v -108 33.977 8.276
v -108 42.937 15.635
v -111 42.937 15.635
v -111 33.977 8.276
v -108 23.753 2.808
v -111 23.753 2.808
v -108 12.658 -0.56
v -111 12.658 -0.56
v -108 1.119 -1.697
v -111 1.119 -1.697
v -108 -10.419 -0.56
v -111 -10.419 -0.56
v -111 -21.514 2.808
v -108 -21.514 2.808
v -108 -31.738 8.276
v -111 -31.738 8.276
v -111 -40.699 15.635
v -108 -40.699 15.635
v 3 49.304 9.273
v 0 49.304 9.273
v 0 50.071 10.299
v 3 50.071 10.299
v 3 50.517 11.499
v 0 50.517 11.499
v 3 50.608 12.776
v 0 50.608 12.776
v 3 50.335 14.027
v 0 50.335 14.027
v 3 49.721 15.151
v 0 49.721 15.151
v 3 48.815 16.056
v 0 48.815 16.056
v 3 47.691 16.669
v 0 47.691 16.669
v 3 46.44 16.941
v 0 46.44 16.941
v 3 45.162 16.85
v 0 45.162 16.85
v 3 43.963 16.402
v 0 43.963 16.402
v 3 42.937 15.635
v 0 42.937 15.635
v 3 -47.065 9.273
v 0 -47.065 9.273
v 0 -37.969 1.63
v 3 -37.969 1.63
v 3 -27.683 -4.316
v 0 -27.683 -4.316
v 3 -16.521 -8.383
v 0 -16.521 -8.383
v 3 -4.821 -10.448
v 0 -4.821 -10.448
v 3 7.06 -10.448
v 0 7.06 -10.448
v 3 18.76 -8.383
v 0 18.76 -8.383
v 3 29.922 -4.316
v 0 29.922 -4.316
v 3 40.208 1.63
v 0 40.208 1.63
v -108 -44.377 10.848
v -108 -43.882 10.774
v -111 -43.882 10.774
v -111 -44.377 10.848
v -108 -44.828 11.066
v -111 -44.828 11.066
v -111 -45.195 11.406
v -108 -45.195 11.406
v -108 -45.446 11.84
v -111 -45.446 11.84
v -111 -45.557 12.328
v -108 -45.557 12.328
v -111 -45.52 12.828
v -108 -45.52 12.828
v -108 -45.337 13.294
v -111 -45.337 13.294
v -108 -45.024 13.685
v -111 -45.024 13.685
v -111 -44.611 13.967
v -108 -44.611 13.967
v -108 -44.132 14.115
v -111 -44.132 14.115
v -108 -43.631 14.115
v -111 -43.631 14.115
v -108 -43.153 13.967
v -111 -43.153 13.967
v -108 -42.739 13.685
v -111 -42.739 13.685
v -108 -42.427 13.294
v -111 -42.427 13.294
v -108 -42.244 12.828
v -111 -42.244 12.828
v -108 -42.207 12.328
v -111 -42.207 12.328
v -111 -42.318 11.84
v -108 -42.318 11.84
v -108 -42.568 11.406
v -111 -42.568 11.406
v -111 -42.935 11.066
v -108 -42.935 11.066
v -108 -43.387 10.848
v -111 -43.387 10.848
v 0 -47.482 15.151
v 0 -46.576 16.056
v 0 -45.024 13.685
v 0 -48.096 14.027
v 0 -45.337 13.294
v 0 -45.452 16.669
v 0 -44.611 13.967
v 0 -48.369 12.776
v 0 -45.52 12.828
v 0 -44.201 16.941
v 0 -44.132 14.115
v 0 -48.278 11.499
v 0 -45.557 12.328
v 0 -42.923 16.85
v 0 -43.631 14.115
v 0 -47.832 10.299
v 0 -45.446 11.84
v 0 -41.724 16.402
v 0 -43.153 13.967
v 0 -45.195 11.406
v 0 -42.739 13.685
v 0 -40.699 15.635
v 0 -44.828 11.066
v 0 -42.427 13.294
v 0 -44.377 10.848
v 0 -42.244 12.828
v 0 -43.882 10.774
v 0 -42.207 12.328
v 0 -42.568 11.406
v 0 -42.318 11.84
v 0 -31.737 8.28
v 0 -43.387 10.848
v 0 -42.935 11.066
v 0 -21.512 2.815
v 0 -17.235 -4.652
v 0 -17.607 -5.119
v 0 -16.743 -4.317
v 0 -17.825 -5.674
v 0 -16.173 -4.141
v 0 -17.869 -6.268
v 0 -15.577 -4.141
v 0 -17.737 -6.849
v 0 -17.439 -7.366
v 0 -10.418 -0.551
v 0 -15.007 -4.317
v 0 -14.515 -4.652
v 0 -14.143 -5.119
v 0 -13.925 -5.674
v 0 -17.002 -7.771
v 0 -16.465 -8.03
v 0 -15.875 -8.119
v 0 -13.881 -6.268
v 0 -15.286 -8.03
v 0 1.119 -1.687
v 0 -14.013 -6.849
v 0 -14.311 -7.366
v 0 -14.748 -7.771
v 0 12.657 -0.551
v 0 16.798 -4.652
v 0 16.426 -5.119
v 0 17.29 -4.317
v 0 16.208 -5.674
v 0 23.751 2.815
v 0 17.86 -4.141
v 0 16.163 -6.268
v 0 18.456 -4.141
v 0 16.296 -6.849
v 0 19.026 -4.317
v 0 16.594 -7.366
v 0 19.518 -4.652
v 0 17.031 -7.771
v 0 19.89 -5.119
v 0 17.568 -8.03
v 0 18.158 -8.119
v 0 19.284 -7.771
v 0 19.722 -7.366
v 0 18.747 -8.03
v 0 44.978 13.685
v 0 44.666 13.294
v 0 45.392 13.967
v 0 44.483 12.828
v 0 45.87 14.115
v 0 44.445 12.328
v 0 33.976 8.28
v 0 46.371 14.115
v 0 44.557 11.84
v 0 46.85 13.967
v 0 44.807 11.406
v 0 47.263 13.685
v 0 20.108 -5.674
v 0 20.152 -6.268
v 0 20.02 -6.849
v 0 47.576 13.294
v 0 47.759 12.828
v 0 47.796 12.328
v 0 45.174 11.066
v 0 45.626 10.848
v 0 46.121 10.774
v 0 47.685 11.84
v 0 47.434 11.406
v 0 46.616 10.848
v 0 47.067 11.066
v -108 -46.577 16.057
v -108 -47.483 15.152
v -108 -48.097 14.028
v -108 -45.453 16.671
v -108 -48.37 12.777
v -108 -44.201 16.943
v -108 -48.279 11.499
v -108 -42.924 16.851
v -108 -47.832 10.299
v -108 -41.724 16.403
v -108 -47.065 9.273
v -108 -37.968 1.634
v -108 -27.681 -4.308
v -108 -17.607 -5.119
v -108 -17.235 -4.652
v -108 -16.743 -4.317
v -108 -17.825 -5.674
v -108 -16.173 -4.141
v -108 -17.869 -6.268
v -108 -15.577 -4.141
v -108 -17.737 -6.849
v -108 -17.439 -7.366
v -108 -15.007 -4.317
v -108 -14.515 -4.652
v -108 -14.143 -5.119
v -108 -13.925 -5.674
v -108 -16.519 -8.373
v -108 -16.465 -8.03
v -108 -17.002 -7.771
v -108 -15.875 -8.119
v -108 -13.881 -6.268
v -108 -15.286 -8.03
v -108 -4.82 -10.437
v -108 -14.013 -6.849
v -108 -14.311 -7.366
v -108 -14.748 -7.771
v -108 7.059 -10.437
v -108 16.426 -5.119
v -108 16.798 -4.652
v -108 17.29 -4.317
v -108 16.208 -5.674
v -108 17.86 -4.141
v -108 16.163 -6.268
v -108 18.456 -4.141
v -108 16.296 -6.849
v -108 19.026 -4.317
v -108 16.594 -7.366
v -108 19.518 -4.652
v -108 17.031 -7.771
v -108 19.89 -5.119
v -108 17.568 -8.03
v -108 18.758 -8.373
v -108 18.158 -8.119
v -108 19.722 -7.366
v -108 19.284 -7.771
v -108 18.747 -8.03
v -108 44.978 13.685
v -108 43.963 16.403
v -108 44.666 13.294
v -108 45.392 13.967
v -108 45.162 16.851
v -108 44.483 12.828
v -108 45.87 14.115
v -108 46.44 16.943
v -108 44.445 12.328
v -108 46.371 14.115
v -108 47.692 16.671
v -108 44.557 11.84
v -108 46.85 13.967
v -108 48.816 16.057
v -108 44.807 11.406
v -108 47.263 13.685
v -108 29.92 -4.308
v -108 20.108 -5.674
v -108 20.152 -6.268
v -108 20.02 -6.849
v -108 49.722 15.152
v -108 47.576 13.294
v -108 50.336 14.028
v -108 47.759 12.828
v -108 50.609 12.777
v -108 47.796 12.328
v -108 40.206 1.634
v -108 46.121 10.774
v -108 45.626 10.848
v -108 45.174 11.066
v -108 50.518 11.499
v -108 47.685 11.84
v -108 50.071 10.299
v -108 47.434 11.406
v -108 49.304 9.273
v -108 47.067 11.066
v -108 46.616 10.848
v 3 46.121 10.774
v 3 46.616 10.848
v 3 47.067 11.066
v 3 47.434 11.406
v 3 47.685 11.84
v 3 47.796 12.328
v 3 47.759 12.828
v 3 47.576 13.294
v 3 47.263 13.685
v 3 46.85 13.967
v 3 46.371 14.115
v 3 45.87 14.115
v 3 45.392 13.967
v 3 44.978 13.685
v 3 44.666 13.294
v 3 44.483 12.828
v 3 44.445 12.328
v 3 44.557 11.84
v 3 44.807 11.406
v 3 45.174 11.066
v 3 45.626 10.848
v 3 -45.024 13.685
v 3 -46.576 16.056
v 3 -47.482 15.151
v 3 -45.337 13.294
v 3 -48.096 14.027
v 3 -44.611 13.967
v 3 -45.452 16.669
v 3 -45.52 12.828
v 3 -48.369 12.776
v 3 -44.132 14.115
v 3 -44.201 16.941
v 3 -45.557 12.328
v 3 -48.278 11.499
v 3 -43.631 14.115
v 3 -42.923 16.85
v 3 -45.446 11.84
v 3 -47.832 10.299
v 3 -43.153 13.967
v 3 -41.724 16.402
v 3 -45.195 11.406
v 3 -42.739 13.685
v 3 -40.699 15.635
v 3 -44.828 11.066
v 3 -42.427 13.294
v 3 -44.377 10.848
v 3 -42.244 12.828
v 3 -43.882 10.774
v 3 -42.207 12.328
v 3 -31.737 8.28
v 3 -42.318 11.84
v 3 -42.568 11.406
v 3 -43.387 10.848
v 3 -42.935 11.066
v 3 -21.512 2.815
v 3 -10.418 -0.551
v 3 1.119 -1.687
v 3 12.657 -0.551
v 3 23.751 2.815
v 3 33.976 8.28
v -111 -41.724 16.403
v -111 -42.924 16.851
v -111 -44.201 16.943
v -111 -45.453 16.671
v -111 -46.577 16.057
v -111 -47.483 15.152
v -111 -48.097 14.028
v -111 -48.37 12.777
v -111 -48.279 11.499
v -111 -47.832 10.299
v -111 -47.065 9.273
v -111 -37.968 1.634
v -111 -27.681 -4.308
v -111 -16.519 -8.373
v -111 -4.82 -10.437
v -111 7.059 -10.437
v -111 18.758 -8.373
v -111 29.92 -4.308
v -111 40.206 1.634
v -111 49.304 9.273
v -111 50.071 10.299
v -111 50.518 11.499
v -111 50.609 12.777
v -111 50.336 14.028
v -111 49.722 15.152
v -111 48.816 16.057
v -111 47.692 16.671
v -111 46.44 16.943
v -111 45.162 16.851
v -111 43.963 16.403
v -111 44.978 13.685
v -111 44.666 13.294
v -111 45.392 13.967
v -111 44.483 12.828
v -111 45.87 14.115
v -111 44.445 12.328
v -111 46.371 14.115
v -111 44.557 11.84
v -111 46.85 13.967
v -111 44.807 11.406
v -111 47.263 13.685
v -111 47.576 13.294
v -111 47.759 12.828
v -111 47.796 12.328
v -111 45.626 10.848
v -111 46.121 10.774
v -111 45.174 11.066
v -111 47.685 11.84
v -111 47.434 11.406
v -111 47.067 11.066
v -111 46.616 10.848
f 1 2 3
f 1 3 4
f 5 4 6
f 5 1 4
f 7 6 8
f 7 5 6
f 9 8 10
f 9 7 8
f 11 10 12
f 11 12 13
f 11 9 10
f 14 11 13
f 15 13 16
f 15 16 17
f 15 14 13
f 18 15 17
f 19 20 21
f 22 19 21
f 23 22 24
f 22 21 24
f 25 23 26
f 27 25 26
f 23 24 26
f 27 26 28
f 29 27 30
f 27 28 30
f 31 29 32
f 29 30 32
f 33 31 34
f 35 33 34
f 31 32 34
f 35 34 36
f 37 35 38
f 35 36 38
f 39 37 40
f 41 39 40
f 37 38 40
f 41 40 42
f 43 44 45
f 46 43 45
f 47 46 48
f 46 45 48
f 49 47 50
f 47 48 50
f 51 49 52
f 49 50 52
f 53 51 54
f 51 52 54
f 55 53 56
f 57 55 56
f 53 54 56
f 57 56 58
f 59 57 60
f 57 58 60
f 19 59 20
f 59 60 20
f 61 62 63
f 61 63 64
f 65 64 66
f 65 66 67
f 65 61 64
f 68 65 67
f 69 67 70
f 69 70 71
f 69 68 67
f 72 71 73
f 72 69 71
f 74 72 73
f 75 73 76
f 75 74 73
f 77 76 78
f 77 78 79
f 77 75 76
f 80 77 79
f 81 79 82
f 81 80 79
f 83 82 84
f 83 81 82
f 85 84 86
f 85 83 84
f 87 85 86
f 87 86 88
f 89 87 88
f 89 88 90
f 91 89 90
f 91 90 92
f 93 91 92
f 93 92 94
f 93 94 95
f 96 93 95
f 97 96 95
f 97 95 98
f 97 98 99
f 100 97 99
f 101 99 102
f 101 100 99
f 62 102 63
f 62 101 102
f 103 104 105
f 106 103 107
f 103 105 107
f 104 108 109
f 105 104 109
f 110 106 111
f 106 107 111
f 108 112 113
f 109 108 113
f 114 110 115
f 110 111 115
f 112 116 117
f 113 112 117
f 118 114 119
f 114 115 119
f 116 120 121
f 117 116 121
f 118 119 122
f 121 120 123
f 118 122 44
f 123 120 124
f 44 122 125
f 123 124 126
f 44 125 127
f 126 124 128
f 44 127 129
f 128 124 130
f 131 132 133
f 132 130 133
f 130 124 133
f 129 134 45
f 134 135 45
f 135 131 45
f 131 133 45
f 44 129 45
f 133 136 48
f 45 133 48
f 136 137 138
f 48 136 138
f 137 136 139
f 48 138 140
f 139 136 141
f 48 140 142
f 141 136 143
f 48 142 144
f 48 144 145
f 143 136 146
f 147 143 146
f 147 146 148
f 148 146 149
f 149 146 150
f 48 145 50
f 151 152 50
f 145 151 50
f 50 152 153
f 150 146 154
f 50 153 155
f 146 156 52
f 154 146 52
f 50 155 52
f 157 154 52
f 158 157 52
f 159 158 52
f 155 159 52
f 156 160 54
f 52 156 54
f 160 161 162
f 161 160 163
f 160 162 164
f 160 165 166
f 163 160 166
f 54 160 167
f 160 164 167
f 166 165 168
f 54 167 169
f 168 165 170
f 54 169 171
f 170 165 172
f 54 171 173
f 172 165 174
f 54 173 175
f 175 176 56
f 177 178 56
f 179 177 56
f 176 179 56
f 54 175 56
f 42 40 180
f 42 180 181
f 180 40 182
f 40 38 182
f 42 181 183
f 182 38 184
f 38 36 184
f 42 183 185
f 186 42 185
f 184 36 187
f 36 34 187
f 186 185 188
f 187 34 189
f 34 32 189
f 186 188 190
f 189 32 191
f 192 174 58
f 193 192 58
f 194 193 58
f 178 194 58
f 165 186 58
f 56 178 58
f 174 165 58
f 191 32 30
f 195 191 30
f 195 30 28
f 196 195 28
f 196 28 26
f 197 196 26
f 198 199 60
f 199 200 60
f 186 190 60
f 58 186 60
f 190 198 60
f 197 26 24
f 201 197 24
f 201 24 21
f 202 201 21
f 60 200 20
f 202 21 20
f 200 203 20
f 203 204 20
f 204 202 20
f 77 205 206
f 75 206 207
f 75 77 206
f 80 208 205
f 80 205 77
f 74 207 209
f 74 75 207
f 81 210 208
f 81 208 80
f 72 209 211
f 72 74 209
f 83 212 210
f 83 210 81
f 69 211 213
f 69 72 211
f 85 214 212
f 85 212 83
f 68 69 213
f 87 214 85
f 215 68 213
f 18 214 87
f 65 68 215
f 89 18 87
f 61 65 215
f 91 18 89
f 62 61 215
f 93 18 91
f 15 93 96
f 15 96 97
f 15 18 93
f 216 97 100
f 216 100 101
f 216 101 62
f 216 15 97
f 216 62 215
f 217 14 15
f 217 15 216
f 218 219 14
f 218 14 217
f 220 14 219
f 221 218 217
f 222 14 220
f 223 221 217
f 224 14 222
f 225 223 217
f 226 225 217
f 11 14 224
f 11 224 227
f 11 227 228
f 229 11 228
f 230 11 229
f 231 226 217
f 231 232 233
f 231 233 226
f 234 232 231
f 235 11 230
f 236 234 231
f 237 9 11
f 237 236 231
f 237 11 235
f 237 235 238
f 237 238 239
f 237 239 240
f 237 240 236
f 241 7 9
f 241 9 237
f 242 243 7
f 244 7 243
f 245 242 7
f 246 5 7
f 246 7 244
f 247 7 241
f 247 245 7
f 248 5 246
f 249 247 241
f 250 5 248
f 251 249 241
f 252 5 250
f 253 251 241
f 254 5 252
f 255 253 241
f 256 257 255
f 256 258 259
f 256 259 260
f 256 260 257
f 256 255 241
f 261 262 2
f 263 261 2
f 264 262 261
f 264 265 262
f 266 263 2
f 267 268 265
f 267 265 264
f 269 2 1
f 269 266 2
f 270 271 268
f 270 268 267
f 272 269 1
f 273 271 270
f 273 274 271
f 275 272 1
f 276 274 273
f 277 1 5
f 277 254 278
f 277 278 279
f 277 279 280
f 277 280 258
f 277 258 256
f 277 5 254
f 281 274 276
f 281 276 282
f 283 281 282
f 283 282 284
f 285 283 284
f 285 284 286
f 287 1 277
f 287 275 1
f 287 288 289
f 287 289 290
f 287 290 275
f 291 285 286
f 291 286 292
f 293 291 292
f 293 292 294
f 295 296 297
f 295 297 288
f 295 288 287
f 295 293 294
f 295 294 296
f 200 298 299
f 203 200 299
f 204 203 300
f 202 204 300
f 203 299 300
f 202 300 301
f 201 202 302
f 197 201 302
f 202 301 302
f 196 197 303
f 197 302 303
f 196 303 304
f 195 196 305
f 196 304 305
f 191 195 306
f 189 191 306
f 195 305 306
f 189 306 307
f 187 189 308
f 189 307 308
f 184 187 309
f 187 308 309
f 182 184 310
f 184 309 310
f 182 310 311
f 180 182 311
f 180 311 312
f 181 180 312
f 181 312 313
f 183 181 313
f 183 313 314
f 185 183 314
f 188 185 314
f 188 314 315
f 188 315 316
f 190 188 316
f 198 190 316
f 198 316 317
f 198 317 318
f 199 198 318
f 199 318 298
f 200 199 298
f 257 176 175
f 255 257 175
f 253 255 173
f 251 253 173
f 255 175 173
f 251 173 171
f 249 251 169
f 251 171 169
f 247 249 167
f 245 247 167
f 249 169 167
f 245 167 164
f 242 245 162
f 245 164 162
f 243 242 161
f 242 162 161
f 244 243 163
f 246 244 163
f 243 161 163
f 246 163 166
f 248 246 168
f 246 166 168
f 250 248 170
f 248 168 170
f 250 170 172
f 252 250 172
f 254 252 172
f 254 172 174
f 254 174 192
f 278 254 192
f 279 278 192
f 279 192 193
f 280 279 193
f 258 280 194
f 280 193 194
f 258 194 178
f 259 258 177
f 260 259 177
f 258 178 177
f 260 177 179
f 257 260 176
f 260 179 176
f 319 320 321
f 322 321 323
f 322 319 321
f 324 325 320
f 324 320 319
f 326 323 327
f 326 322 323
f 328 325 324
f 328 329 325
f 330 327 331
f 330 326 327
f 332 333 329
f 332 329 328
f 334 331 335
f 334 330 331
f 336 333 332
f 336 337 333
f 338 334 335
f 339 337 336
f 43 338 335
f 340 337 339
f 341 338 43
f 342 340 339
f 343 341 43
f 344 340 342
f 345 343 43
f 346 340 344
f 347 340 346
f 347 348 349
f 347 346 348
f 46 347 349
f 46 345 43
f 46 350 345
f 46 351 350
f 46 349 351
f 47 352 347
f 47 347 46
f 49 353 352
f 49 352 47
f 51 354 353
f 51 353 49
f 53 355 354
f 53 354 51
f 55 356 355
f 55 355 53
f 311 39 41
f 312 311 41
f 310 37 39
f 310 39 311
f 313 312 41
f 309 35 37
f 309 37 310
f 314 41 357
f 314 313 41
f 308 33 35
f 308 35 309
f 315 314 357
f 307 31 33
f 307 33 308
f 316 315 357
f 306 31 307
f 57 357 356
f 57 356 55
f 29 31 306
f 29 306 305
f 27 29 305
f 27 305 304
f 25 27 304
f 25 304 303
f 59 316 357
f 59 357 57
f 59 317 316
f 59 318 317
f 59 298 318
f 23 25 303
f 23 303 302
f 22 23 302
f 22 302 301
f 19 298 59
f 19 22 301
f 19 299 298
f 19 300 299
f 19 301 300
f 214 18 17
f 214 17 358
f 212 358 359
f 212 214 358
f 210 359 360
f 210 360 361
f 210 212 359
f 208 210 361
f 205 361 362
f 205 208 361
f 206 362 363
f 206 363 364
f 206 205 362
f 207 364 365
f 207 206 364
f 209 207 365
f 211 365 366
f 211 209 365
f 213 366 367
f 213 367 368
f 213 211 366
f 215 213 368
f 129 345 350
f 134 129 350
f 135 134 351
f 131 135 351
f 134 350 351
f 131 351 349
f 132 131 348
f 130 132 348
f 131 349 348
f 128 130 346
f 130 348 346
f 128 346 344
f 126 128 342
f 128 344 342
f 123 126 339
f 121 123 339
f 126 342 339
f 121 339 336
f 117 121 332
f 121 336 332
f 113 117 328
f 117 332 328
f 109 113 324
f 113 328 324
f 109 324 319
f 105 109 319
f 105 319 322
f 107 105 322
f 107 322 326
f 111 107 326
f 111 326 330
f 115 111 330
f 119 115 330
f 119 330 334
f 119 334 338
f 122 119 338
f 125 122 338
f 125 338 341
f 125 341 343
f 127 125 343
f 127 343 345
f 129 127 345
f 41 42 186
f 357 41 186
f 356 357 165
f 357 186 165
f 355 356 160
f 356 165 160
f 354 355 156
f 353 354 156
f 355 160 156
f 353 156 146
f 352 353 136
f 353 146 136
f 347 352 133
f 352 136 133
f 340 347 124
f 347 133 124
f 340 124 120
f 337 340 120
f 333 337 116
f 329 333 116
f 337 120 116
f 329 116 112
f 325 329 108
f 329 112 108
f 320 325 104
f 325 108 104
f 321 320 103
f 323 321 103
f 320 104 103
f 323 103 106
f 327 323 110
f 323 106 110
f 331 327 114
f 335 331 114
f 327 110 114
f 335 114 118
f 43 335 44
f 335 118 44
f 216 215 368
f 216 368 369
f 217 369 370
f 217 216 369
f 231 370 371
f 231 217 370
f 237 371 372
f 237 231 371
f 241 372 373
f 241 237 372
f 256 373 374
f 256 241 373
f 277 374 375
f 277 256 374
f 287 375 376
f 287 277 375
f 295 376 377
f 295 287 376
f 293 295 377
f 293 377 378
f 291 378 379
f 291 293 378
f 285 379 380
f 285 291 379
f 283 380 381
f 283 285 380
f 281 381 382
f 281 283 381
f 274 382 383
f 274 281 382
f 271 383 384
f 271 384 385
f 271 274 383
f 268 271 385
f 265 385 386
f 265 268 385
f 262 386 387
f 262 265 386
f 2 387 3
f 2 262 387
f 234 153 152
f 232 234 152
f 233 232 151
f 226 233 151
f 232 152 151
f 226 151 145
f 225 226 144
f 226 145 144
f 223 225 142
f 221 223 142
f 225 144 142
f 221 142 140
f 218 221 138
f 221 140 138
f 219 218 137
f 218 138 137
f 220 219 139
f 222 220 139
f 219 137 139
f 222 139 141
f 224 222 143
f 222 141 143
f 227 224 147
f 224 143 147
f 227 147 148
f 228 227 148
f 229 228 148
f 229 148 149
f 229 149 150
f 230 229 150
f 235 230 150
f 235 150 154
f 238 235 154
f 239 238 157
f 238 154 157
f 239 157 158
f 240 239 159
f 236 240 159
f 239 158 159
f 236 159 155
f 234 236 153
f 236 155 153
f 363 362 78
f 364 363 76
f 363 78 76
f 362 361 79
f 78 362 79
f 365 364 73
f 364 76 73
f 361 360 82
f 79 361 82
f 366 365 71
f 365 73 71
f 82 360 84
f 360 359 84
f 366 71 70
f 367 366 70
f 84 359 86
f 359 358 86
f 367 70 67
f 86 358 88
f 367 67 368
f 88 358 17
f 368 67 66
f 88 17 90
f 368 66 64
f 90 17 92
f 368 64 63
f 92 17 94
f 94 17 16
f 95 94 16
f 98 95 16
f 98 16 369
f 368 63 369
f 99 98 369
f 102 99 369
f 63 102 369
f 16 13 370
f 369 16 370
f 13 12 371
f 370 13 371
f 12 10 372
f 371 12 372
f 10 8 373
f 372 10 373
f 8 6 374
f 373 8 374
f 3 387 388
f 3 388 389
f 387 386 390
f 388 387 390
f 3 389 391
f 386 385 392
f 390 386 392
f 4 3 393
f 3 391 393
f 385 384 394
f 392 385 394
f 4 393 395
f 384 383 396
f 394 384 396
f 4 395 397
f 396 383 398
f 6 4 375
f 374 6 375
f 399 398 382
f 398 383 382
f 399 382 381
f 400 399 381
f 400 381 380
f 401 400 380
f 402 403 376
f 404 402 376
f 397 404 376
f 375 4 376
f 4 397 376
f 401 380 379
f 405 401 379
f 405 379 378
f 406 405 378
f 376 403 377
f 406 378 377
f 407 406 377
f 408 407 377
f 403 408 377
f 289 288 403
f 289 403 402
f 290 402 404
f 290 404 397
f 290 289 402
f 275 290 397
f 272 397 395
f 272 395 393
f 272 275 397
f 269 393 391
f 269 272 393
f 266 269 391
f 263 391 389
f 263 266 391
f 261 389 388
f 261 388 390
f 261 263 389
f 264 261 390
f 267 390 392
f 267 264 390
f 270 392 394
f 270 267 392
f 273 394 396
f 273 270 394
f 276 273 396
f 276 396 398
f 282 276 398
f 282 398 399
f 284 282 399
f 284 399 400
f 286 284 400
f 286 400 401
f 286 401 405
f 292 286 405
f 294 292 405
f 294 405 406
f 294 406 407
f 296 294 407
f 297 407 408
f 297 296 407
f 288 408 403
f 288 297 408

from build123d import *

# Parameters (mm, degrees)
BOSS_EXTRUDE1_DEPTH  = 3
SKETCH4_R            = 1.68
CUT_EXTRUDE1_DEPTH   = 54.466990195
SKETCH2_R            = 2
BOSS_EXTRUDE11_DEPTH = 108
SKETCH8_R            = 1.68
BOSS_EXTRUDE12_DEPTH = 3


with BuildPart() as part:
    # Sketch1 → Boss-Extrude1 (new body)
    with BuildSketch(Plane(origin=(0, 0, 0), x_dir=(0, 0, -1), z_dir=(1, 0, 0))):
        with BuildLine():
            ThreePointArc((-15.634588923, -40.698575462), (-15.635835692, -47.061289367), (-9.273122764, -47.06502941))
            ThreePointArc((-9.273122764, -47.06502941), (10.707664933, 1.119443717), (-9.273121767, 49.303917257))
            ThreePointArc((-9.273121767, 49.303917257), (-15.635834695, 49.300177346), (-15.634588058, 42.937463441))
            ThreePointArc((-15.634588058, 42.937463441), (1.687002572, 1.11944381), (-15.634588923, -40.698575462))
        make_face()
    extrude(amount=BOSS_EXTRUDE1_DEPTH)

    # Sketch4 → Cut-Extrude1 (cut, through all)
    with BuildSketch(Plane(origin=(3, 0, 0), x_dir=(0, 0, -1), z_dir=(1, 0, 0))):
        with Locations((-12.453854912, 46.120690349)):
            Circle(SKETCH4_R)
        with Locations((-12.453855844, -43.881802436)):
            Circle(SKETCH4_R)
    extrude(amount=-CUT_EXTRUDE1_DEPTH, mode=Mode.SUBTRACT)

    # Sketch2 → Boss-Extrude11 (add)
    with BuildSketch(Plane.ZY):
        with Locations(Location((-6.118587434, 18.157847035, 0), (0, 0, 180))):
            Circle(SKETCH2_R)
        with Locations(Location((-6.118587434, -15.875057848, 0), (0, 0, 180))):
            Circle(SKETCH2_R)
    extrude(amount=BOSS_EXTRUDE11_DEPTH)

    # Sketch8 → Boss-Extrude12 (add)
    with BuildSketch(Plane.ZY.offset(108)):
        with BuildLine():
            ThreePointArc((9.273121767, 49.303917257), (15.63708182, 49.301423495), (15.634588058, 42.937463441))
            ThreePointArc((15.634588058, 42.937463441), (-1.696602448, 1.11944381), (15.634588923, -40.698575462))
            ThreePointArc((15.634588923, -40.698575462), (15.637082818, -47.062535516), (9.273122764, -47.06502941))
            ThreePointArc((9.273122764, -47.06502941), (-10.696601757, 1.119443717), (9.273121767, 49.303917257))
        make_face()
        with Locations(Location((12.453854912, 46.120690349, 0), (0, 0, 180))):
            Circle(SKETCH8_R, mode=Mode.SUBTRACT)
        with Locations(Location((12.453855844, -43.881802436, 0), (0, 0, 180))):
            Circle(SKETCH8_R, mode=Mode.SUBTRACT)
    extrude(amount=BOSS_EXTRUDE12_DEPTH)


solid = part.part
